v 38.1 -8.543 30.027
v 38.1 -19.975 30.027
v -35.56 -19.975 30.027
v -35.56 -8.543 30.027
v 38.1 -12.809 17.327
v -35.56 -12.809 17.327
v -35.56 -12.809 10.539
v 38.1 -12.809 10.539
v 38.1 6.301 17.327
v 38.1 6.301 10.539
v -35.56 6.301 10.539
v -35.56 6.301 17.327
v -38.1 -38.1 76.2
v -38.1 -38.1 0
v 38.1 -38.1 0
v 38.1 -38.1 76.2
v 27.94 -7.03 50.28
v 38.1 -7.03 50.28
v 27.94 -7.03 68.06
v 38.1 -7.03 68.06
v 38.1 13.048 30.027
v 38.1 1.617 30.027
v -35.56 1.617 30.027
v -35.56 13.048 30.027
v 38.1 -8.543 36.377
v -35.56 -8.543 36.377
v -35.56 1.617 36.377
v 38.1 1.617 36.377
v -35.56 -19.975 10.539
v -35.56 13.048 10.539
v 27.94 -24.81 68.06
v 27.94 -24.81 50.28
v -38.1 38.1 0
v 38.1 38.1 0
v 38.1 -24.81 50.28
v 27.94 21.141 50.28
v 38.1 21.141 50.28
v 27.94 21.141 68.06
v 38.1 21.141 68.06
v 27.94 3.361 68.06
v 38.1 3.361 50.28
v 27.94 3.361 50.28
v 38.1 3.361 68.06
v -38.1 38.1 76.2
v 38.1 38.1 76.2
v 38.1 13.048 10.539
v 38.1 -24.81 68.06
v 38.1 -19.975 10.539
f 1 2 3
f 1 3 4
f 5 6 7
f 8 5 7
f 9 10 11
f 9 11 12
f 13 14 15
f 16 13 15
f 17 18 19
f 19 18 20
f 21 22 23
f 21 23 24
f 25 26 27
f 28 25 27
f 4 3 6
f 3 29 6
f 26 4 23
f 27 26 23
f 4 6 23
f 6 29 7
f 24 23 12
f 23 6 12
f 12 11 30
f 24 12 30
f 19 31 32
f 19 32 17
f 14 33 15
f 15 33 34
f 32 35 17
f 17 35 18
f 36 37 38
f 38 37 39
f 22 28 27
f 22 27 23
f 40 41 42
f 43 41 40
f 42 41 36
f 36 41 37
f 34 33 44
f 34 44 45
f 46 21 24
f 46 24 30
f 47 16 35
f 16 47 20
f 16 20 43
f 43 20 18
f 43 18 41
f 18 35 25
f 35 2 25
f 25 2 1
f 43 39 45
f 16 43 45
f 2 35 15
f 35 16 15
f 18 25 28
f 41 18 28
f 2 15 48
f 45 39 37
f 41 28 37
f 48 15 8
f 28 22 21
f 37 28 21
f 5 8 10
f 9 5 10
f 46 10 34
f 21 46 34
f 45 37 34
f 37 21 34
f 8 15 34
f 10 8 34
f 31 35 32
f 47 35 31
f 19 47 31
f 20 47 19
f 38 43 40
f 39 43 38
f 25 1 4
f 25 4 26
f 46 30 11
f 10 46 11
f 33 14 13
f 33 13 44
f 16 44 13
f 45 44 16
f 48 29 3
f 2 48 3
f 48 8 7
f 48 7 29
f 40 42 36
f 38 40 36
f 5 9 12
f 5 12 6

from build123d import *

# Parameters (mm, degrees)
F0_W     = 76.2
F0_H     = 76.2
F1_DEPTH = 76.2
F3_T     = -2.54
F2_W     = 76.2
F2_H     = 76.2
F2_W_2   = 17.78
F2_H_2   = 17.78
F4_DEPTH = 76.2
F5_DEPTH = 63.5


with BuildPart() as f1:
    # F0 (on Top) → F1 (new body)
    with BuildSketch(Plane.XY):
        Rectangle(F0_W, F0_H)
    extrude(amount=F1_DEPTH)

    # F3
    f3_openings = [f1.faces().sort_by_distance(p)[0] for p in [
        (38.1, 0, 38.1),
    ]]
    offset(amount=F3_T, openings=f3_openings)

    # F2 (on face) → F4 (join)
    with BuildSketch(Plane.YZ.offset(38.1)):
        with Locations((0, 38.1)):
            Rectangle(F2_W, F2_H)
        Polygon((-8.5432641208, 30.0269989133), (-8.5432641208, 36.3769989133), (1.6167358792, 36.3769989133), (1.6167358792, 30.0269989133), (13.0484727508, 30.0269989133), (13.0484727508, 23.6769989133), (13.0484727508, 17.3269989133), (13.0484727508, 10.5390315875), (6.3009303994, 10.5390315875), (6.3009303994, 17.3269989133), (-12.8088379279, 17.3269989133), (-12.8088379279, 10.5390315875), (-19.9750009924, 10.5390315875), (-19.9750009924, 17.3269989133), (-19.9750009924, 23.6769989133), (-19.9750009924, 30.0269989133), align=None, mode=Mode.SUBTRACT)
        with Locations((-15.9198542664, 59.1702901899)):
            Rectangle(F2_W_2, F2_H_2, mode=Mode.SUBTRACT)
        with Locations((12.2508332058, 59.1702901899)):
            Rectangle(F2_W_2, F2_H_2, mode=Mode.SUBTRACT)
    extrude(amount=-F4_DEPTH)

    # F5 (add): faces of the model
    f5_faces = [f1.faces().sort_by_distance(p)[0] for p in [
        (-35.56, -15.9198542664, 59.1702901899),
        (-35.56, 12.2508332058, 59.1702901899),
    ]]
    extrude(f5_faces, amount=F5_DEPTH)


solid = f1.part
